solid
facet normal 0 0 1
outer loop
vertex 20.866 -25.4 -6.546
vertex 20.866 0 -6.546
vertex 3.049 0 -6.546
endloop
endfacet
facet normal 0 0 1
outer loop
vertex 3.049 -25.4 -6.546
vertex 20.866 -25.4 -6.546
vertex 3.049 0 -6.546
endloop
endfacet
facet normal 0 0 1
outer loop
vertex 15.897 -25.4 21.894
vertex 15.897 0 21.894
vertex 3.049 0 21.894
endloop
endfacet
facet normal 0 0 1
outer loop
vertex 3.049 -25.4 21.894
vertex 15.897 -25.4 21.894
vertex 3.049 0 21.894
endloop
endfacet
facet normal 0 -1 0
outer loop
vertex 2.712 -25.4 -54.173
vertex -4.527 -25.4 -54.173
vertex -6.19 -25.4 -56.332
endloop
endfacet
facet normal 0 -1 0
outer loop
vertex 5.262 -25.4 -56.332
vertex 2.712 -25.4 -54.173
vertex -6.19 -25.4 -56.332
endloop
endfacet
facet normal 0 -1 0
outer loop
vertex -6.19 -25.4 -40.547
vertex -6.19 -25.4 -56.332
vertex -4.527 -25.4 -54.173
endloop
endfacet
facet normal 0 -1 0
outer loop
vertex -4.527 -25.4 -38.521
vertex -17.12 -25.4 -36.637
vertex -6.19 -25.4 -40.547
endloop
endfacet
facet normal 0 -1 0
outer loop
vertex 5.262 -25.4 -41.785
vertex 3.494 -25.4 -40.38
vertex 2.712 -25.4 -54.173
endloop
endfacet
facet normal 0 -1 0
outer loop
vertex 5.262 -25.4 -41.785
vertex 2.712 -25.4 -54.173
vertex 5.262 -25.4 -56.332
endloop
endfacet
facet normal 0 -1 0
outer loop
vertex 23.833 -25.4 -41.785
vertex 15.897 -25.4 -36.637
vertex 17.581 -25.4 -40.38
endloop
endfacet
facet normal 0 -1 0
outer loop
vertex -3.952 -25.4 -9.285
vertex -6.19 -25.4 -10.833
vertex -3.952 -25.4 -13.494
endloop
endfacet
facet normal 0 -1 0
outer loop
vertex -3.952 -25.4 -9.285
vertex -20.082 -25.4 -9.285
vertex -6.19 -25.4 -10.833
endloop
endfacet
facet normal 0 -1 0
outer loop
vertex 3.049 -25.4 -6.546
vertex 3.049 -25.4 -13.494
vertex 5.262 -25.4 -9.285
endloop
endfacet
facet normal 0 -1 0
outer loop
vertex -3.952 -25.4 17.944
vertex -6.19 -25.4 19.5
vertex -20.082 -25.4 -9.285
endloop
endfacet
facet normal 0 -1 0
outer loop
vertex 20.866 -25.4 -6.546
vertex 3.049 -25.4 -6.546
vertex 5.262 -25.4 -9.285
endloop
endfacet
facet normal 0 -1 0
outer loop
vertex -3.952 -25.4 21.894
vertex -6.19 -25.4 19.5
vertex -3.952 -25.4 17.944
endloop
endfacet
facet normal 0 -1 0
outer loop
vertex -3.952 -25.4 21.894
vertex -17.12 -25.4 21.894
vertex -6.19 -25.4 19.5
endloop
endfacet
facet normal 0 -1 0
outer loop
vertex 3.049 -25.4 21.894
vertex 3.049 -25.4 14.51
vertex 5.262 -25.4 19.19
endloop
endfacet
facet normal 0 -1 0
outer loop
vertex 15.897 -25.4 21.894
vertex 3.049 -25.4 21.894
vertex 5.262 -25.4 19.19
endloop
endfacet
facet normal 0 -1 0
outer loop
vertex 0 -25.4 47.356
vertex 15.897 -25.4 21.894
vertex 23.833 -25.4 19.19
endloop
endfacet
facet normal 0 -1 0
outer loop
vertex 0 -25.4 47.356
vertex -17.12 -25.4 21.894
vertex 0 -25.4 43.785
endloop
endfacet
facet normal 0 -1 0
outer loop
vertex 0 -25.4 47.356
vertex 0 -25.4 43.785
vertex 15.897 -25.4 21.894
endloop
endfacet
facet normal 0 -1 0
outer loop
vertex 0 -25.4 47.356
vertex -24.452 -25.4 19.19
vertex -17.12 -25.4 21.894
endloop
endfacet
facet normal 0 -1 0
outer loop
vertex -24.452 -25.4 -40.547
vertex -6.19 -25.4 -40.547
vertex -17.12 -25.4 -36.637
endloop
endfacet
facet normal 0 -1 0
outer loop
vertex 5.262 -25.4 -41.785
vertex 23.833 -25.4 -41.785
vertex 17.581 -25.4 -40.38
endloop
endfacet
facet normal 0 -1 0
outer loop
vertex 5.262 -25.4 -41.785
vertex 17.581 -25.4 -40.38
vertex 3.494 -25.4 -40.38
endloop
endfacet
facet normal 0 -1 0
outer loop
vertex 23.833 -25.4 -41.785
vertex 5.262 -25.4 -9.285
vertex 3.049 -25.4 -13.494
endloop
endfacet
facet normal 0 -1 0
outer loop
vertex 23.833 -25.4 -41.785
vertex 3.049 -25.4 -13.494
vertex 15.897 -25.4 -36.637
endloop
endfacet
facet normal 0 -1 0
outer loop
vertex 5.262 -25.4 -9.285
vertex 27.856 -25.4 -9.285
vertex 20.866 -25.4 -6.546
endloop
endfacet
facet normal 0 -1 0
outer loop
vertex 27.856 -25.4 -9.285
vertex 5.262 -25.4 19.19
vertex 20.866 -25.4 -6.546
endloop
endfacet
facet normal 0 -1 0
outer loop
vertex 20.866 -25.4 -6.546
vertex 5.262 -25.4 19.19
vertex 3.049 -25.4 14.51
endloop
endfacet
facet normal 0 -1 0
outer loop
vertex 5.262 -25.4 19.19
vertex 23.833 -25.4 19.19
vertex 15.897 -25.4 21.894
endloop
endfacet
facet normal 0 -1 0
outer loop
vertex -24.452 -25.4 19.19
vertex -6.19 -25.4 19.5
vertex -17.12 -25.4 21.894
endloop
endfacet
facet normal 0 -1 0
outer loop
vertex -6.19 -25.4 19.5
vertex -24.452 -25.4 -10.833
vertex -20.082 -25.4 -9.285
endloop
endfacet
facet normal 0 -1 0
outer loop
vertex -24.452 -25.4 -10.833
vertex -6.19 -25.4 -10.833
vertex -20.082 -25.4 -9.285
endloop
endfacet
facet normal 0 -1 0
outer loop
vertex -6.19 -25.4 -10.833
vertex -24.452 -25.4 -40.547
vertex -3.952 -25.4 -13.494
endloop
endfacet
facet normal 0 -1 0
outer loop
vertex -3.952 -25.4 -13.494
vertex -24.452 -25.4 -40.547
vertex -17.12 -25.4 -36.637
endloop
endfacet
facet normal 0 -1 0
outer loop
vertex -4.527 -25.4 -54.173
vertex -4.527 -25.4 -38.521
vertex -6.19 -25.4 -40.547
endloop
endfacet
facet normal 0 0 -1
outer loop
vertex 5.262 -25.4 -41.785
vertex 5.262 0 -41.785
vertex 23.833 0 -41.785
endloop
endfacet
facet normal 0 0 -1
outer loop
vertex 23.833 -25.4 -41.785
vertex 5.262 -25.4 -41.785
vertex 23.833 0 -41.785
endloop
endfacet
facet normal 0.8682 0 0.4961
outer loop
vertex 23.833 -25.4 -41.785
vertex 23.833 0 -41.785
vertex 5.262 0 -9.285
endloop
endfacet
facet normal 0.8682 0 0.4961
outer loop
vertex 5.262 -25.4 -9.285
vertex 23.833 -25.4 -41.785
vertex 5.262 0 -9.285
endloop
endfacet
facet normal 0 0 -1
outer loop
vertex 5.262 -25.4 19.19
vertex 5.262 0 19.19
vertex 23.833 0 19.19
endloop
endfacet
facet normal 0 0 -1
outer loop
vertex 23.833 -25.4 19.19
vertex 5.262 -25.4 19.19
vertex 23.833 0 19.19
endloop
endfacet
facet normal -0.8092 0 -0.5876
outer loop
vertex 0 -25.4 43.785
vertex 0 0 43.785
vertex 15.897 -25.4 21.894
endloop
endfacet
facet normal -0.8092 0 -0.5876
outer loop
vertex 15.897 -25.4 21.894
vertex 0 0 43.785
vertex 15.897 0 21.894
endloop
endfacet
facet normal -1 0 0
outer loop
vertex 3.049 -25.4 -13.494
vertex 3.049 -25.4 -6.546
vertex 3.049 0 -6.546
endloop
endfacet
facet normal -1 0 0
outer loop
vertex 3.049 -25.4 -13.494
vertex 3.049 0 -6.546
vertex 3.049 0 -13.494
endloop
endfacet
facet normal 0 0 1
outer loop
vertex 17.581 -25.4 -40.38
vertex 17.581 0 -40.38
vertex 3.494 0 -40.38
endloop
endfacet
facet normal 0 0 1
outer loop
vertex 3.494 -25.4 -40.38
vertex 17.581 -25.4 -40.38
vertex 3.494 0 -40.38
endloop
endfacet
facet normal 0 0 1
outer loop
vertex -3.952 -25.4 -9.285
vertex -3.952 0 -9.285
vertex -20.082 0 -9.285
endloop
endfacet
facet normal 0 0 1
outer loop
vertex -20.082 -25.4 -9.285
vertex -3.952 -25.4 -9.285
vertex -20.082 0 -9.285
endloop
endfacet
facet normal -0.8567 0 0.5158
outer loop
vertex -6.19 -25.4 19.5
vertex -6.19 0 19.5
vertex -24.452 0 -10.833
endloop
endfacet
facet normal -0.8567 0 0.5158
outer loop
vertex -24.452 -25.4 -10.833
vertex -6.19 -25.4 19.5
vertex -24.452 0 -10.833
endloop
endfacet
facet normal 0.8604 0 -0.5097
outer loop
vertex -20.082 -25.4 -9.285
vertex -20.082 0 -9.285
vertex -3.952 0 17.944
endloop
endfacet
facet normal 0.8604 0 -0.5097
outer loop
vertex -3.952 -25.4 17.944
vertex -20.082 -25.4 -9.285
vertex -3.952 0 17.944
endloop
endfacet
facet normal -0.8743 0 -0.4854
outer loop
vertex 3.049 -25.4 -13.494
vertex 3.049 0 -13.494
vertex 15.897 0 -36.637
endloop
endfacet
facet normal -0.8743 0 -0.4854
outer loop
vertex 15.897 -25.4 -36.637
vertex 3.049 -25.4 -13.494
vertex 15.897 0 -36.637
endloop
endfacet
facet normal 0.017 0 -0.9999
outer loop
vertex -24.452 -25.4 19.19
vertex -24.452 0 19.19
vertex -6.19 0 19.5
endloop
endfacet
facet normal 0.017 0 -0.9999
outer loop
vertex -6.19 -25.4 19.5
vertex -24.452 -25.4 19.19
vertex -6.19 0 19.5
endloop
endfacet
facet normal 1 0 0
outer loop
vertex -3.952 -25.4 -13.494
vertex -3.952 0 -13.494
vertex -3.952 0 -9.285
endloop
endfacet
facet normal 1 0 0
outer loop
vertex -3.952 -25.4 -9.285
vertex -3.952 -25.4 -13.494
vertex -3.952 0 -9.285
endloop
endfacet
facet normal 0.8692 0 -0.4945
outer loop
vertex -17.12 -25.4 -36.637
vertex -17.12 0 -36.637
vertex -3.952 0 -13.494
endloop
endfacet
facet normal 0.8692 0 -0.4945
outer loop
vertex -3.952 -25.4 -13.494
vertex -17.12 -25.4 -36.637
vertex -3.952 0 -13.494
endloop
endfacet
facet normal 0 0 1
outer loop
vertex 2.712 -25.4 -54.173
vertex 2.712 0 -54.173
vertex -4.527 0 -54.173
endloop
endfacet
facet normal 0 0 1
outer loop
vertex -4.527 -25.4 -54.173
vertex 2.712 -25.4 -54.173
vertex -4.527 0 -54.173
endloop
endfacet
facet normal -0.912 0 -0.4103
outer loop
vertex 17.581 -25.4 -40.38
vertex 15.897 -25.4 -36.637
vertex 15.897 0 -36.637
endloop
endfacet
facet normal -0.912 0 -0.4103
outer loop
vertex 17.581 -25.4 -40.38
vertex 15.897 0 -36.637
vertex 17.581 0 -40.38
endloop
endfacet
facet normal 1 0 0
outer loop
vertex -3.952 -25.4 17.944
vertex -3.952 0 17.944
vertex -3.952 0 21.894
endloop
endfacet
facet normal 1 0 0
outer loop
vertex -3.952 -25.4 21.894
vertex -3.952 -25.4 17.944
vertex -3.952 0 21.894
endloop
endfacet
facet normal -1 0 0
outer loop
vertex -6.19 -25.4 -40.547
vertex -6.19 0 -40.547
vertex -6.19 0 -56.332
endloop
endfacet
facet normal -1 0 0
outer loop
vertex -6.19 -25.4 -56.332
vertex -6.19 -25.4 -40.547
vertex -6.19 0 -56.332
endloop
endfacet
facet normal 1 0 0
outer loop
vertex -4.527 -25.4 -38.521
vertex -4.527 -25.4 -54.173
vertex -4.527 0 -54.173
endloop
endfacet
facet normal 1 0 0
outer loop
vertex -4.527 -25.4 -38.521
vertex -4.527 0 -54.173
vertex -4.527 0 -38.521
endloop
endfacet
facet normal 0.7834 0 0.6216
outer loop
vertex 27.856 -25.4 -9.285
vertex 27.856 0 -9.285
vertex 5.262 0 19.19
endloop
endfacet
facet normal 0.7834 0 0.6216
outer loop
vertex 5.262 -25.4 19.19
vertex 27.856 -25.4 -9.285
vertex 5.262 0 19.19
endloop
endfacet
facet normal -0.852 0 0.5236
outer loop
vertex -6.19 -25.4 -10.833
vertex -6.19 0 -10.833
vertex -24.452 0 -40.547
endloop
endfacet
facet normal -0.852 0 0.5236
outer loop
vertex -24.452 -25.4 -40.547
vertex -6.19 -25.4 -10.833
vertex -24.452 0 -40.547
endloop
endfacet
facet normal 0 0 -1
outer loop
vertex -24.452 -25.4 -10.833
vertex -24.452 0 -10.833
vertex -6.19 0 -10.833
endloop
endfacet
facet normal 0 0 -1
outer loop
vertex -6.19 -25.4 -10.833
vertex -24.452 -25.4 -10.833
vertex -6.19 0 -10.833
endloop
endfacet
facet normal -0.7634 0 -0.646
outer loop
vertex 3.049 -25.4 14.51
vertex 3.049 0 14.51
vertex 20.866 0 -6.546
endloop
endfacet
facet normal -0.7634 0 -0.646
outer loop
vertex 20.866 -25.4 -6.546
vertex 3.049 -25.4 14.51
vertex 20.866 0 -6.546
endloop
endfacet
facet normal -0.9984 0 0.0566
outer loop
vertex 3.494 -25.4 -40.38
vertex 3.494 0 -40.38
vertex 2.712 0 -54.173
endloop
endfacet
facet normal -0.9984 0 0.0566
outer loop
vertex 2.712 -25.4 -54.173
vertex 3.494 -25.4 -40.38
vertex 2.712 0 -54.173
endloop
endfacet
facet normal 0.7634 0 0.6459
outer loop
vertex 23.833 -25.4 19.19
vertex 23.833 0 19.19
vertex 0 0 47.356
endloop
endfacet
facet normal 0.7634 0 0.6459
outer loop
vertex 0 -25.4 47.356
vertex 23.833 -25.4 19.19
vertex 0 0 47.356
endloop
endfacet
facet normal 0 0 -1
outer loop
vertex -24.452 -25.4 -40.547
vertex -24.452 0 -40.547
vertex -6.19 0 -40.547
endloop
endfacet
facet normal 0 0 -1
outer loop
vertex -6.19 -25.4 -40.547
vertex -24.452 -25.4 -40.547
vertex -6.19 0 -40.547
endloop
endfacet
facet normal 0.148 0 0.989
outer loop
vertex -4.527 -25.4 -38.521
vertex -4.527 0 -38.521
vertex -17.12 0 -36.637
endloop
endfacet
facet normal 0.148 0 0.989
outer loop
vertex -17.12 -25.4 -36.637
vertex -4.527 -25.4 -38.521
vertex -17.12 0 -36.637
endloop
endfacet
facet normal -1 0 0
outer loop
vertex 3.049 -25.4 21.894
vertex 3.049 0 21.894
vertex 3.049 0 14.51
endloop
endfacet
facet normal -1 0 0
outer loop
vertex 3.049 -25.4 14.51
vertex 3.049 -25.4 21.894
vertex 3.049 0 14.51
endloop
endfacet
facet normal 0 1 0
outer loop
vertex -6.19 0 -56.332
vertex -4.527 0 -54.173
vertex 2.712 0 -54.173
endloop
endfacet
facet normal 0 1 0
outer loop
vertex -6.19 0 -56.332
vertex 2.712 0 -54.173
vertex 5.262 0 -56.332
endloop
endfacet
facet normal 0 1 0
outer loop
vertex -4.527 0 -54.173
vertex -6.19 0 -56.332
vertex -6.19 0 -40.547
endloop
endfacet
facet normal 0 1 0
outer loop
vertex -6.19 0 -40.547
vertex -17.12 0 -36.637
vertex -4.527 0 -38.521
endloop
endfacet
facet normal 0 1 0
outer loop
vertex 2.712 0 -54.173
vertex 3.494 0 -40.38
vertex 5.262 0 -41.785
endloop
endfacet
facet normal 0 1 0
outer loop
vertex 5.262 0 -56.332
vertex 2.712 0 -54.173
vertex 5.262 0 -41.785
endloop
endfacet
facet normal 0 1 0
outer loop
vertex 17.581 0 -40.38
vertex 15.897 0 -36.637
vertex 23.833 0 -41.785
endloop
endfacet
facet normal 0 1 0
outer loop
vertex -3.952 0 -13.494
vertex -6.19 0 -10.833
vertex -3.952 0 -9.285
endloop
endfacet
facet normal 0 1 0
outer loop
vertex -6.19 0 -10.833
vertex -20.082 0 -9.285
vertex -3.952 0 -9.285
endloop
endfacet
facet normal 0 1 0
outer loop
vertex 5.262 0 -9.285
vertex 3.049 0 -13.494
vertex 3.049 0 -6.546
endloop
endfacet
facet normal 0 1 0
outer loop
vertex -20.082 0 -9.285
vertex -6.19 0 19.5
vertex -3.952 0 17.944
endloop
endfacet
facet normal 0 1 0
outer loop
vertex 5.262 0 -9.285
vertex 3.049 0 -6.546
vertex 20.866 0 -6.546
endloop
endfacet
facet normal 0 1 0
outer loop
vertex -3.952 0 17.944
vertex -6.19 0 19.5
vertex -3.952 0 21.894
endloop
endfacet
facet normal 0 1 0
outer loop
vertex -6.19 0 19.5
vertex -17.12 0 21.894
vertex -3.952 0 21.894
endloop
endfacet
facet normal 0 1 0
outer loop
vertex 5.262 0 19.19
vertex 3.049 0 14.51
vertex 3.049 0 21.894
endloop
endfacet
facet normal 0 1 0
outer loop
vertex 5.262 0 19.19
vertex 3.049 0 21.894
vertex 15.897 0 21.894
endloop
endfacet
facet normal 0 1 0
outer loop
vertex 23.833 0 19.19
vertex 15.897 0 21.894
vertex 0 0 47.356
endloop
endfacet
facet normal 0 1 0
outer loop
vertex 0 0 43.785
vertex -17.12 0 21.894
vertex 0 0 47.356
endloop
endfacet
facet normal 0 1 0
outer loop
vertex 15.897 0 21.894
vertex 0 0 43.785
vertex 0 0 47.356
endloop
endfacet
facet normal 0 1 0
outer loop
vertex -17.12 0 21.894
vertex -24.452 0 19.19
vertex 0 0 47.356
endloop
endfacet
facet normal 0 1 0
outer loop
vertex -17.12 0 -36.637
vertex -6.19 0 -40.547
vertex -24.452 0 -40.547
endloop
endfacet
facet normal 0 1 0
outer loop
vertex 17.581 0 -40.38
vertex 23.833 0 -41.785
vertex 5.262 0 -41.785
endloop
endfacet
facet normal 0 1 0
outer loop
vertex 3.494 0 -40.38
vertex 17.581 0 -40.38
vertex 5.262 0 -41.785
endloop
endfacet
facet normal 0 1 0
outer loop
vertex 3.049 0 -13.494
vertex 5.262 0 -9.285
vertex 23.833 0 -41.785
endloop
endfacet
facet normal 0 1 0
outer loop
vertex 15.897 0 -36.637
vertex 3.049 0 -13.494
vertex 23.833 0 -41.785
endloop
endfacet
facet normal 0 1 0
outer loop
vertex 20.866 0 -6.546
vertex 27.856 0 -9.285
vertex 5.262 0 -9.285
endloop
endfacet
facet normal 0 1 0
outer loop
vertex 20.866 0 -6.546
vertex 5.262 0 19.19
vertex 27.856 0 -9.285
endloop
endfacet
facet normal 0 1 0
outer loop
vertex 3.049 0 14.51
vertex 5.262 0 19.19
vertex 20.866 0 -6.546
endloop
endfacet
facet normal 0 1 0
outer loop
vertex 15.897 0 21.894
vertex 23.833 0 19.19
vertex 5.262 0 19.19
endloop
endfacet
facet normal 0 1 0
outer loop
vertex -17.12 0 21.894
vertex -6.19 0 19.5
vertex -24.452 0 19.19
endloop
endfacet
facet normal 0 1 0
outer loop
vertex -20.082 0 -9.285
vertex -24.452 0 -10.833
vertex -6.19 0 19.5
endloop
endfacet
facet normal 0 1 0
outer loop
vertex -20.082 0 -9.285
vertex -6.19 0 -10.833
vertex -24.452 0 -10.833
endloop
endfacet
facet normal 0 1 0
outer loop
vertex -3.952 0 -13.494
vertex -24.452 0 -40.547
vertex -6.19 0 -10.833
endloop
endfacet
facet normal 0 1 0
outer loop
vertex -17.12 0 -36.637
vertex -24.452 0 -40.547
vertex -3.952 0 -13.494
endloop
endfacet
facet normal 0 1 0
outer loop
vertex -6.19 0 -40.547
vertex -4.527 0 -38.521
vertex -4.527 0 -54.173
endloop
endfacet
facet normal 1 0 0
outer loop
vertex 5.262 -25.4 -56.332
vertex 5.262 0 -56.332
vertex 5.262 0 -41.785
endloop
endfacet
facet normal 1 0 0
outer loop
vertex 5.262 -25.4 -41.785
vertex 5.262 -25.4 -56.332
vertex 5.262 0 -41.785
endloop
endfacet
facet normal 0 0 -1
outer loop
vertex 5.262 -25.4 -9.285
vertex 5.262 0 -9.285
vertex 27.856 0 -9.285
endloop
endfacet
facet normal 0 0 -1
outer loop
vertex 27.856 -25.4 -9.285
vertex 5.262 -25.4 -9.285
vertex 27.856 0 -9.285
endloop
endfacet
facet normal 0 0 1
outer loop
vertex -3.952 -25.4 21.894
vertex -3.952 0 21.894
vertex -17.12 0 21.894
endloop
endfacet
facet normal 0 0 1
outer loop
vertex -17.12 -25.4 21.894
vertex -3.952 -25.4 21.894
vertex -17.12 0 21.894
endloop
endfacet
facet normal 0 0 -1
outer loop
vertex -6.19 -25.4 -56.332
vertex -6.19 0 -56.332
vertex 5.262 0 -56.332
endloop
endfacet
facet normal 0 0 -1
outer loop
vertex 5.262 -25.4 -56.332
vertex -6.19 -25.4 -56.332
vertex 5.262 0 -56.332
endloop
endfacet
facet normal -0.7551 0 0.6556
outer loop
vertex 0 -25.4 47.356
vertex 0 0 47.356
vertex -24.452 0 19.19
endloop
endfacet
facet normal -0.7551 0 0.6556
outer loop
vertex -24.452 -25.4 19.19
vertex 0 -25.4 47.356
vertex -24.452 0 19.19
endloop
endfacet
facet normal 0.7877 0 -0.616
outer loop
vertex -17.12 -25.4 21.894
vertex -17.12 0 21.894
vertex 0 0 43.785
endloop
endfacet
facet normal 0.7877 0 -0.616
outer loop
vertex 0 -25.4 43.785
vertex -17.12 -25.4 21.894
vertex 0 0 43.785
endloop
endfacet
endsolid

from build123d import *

# Parameters (mm, degrees)
F1_DEPTH = 25.4
F4_DEPTH = 25.4


with BuildPart() as f1:
    # F0 (on Front) → F1 (new body)
    with BuildSketch(Plane.XZ):
        Polygon((-29.4040627778, -34.6658416092), (-13.9282392338, -34.6658416092), (-13.9282392338, -54.4748939574), (0, -54.4748939574), (0, -34.0468101203), (12.9996910691, -34.0468101203), (0, -9.9045261741), (19.4995384663, -10.8330762014), (0, 19.4995366037), (12.9996910691, 19.4995366037), (-6.4998446032, 39.9276204407), (-25.3803487867, 19.8090523481), (-8.9759770781, 19.8090523481), (-34.6658416092, -9.9045261741), (-13.9282392338, -10.8330762014), align=None)
        Polygon((-20.9672786295, 22.1136379987), (-11.3465078175, 31.0843549669), (-6.3364817826, 36.2658323126), (6.7840320989, 22.5205328315), (-2.7060393941, 22.5205328315), (-2.7060393941, 17.6217724478), (12.9996910691, -6.8093617447), (-2.3284680181, -6.8093617447), (-2.3284680181, -12.9201814463), (8.0474307761, -32.1897082031), (-3.9969988042, -32.1897082031), (-3.9969988042, -51.0926617871), (-11.4108609159, -50.7606975734), (-11.4108609159, -31.906359816), (-23.4664510936, -31.3665568829), (-11.4108609159, -13.363099657), (-11.4108609159, -7.944371215), (-29.4040627778, -7.1387048811), (-7.8362263739, 19.4995366037), (-7.8362263739, 22.1136379987), align=None, mode=Mode.SUBTRACT)
    extrude(amount=F1_DEPTH)


with BuildPart() as f4:
    # F3 (on Front) → F4 (new body)
    with BuildSketch(Plane.XZ):
        Polygon((-24.4517996907, -40.5466556549), (-6.1903311871, -40.5466556549), (-6.1903311871, -56.3319921494), (5.2617802285, -56.3319921494), (5.2617802285, -41.784722358), (23.8327626139, -41.784722358), (5.2617802285, -9.2854928225), (27.8564821929, -9.2854928225), (5.2617802285, 19.1900189966), (23.8327626139, 19.1900189966), (0, 47.3560169339), (-24.4517996907, 19.1900189966), (-6.1903311871, 19.4995366037), (-24.4517996907, -10.8330762014), (-6.1903311871, -10.8330762014), align=None)
        Polygon((-17.1195007861, 21.893909201), (0, 43.7848083675), (15.8973690122, 21.893909201), (3.0488721095, 21.893909201), (3.0488721095, 14.5096303895), (20.8655081271, -6.5463982989), (3.0488721095, -6.5463982989), (3.0488721095, -13.4936347604), (15.8973690122, -36.6372689605), (17.5805799663, -40.379870683), (3.4944114741, -40.379870683), (2.7118462604, -54.1725791991), (-4.5268801041, -54.1725791991), (-4.5268801041, -38.5212786496), (-17.1195007861, -36.6372689605), (-3.9520426653, -13.4936347604), (-3.9520426653, -9.2854928225), (-20.0821794569, -9.2854928225), (-3.9520426653, 17.9436709732), (-3.9520426653, 21.893909201), align=None, mode=Mode.SUBTRACT)
    extrude(amount=F4_DEPTH)


solid = f4.part
